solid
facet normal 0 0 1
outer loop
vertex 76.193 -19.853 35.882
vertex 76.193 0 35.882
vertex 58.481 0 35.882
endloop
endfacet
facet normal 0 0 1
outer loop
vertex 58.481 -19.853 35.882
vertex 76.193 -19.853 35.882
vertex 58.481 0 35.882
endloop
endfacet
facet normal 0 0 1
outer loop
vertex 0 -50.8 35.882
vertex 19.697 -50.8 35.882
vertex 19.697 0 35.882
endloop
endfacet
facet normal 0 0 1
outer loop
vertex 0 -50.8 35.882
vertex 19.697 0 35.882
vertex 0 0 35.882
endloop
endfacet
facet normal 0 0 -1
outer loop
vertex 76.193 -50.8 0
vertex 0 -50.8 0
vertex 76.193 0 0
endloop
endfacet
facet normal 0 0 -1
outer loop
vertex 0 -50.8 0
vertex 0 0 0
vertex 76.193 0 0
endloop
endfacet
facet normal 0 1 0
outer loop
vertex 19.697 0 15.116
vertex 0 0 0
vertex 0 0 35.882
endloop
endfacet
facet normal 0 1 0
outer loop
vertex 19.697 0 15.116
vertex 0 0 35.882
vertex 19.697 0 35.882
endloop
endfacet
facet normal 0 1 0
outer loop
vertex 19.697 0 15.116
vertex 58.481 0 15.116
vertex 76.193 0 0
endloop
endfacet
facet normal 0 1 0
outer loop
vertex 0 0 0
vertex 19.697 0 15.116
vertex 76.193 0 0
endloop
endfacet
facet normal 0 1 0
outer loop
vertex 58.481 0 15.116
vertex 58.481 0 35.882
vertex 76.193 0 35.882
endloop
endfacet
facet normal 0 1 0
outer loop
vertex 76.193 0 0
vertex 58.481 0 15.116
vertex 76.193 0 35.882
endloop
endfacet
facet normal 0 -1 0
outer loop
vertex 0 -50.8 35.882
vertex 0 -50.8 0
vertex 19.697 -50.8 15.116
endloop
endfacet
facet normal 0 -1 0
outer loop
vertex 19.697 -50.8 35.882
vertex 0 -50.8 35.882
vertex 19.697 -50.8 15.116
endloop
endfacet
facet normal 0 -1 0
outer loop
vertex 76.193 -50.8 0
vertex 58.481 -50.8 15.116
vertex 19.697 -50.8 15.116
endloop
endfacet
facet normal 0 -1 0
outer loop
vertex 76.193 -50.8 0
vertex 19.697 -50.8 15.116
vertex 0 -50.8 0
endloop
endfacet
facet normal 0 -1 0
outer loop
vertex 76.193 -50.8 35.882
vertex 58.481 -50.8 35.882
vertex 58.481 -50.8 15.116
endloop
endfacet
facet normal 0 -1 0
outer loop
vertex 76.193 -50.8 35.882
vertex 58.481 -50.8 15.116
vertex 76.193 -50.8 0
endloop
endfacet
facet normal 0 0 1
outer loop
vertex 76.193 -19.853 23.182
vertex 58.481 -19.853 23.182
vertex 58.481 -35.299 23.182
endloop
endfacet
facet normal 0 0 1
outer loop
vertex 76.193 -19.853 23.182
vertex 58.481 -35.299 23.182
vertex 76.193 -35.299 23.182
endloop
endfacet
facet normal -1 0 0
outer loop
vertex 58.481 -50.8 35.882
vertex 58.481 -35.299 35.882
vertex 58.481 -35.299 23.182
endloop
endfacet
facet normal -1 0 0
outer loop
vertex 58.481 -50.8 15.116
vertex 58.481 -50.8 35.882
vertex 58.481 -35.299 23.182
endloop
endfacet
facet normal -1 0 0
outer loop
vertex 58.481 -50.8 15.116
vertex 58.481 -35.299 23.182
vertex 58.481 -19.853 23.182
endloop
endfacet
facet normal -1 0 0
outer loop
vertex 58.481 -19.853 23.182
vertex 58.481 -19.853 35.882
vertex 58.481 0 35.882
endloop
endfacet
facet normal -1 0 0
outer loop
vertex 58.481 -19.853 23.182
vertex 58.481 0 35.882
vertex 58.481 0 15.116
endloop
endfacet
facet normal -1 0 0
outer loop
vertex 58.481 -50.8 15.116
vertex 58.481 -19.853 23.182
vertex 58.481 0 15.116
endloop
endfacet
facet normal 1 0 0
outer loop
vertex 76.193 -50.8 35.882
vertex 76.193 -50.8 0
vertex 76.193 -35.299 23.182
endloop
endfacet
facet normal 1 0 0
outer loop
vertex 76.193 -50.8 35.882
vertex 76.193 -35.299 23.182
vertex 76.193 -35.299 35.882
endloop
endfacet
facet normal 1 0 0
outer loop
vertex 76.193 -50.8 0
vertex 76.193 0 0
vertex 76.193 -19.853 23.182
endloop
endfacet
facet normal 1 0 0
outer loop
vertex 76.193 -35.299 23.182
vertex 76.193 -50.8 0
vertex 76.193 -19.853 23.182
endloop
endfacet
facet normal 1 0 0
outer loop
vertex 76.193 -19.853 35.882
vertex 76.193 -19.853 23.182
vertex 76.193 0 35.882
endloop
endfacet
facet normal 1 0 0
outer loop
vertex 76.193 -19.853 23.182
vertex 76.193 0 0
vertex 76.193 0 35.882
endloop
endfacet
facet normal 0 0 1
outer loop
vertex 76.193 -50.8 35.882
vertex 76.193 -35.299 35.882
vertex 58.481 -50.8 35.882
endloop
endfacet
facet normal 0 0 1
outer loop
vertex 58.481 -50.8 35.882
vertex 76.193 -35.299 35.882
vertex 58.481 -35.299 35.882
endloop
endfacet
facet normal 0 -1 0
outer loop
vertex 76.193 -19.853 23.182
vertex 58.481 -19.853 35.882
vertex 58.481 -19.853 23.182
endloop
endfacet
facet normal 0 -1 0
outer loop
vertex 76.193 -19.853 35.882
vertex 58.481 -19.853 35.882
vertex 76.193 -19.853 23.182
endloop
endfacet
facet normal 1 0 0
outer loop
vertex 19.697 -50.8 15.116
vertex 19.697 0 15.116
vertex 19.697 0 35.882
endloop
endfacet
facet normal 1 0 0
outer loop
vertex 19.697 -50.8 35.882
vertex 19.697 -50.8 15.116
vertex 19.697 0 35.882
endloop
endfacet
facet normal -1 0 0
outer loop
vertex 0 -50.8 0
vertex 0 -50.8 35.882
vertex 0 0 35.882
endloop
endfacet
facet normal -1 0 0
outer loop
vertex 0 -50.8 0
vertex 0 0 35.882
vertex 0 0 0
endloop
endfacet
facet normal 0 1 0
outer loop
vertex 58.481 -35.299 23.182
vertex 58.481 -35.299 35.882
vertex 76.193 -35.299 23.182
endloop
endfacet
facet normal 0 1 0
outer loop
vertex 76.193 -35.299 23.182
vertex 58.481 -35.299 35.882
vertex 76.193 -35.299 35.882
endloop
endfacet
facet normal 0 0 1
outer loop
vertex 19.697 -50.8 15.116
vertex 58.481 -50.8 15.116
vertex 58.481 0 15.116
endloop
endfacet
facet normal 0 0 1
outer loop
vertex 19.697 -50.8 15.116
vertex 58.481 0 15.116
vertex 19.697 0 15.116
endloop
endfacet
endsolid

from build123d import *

# Parameters (mm, degrees)
F1_DEPTH = 25.4
F2_DEPTH = 25.4
F3_W     = 17.7121385932
F3_H     = 15.4453162104
F4_DEPTH = 12.7


with BuildPart() as f1:
    # F0 (on Front) → F1 (new body)
    with BuildSketch(Plane.XZ):
        Polygon((0, 35.8823463321), (0, 0), (76.1927291751, 0), (76.1927291751, 35.8823463321), (58.4805905819, 35.8823463321), (58.4805905819, 15.1163935661), (19.6971185505, 15.1163935661), (19.6971185505, 35.8823463321), align=None)
    extrude(amount=F1_DEPTH)

    # F2 (add): a face of the model
    f2_faces = [f1.faces().sort_by_distance(p)[0] for p in [
        (37.6819042915, -25.4, 14.7848969887),
    ]]
    extrude(f2_faces, amount=F2_DEPTH)

    # F3 (on face) → F4 (cut, symmetric)
    with BuildSketch(Plane.XY.offset(35.8823463321)):
        with Locations((67.3366598785, -27.5759203359)):
            Rectangle(F3_W, F3_H)
    extrude(amount=F4_DEPTH, both=True, mode=Mode.SUBTRACT)


solid = f1.part
